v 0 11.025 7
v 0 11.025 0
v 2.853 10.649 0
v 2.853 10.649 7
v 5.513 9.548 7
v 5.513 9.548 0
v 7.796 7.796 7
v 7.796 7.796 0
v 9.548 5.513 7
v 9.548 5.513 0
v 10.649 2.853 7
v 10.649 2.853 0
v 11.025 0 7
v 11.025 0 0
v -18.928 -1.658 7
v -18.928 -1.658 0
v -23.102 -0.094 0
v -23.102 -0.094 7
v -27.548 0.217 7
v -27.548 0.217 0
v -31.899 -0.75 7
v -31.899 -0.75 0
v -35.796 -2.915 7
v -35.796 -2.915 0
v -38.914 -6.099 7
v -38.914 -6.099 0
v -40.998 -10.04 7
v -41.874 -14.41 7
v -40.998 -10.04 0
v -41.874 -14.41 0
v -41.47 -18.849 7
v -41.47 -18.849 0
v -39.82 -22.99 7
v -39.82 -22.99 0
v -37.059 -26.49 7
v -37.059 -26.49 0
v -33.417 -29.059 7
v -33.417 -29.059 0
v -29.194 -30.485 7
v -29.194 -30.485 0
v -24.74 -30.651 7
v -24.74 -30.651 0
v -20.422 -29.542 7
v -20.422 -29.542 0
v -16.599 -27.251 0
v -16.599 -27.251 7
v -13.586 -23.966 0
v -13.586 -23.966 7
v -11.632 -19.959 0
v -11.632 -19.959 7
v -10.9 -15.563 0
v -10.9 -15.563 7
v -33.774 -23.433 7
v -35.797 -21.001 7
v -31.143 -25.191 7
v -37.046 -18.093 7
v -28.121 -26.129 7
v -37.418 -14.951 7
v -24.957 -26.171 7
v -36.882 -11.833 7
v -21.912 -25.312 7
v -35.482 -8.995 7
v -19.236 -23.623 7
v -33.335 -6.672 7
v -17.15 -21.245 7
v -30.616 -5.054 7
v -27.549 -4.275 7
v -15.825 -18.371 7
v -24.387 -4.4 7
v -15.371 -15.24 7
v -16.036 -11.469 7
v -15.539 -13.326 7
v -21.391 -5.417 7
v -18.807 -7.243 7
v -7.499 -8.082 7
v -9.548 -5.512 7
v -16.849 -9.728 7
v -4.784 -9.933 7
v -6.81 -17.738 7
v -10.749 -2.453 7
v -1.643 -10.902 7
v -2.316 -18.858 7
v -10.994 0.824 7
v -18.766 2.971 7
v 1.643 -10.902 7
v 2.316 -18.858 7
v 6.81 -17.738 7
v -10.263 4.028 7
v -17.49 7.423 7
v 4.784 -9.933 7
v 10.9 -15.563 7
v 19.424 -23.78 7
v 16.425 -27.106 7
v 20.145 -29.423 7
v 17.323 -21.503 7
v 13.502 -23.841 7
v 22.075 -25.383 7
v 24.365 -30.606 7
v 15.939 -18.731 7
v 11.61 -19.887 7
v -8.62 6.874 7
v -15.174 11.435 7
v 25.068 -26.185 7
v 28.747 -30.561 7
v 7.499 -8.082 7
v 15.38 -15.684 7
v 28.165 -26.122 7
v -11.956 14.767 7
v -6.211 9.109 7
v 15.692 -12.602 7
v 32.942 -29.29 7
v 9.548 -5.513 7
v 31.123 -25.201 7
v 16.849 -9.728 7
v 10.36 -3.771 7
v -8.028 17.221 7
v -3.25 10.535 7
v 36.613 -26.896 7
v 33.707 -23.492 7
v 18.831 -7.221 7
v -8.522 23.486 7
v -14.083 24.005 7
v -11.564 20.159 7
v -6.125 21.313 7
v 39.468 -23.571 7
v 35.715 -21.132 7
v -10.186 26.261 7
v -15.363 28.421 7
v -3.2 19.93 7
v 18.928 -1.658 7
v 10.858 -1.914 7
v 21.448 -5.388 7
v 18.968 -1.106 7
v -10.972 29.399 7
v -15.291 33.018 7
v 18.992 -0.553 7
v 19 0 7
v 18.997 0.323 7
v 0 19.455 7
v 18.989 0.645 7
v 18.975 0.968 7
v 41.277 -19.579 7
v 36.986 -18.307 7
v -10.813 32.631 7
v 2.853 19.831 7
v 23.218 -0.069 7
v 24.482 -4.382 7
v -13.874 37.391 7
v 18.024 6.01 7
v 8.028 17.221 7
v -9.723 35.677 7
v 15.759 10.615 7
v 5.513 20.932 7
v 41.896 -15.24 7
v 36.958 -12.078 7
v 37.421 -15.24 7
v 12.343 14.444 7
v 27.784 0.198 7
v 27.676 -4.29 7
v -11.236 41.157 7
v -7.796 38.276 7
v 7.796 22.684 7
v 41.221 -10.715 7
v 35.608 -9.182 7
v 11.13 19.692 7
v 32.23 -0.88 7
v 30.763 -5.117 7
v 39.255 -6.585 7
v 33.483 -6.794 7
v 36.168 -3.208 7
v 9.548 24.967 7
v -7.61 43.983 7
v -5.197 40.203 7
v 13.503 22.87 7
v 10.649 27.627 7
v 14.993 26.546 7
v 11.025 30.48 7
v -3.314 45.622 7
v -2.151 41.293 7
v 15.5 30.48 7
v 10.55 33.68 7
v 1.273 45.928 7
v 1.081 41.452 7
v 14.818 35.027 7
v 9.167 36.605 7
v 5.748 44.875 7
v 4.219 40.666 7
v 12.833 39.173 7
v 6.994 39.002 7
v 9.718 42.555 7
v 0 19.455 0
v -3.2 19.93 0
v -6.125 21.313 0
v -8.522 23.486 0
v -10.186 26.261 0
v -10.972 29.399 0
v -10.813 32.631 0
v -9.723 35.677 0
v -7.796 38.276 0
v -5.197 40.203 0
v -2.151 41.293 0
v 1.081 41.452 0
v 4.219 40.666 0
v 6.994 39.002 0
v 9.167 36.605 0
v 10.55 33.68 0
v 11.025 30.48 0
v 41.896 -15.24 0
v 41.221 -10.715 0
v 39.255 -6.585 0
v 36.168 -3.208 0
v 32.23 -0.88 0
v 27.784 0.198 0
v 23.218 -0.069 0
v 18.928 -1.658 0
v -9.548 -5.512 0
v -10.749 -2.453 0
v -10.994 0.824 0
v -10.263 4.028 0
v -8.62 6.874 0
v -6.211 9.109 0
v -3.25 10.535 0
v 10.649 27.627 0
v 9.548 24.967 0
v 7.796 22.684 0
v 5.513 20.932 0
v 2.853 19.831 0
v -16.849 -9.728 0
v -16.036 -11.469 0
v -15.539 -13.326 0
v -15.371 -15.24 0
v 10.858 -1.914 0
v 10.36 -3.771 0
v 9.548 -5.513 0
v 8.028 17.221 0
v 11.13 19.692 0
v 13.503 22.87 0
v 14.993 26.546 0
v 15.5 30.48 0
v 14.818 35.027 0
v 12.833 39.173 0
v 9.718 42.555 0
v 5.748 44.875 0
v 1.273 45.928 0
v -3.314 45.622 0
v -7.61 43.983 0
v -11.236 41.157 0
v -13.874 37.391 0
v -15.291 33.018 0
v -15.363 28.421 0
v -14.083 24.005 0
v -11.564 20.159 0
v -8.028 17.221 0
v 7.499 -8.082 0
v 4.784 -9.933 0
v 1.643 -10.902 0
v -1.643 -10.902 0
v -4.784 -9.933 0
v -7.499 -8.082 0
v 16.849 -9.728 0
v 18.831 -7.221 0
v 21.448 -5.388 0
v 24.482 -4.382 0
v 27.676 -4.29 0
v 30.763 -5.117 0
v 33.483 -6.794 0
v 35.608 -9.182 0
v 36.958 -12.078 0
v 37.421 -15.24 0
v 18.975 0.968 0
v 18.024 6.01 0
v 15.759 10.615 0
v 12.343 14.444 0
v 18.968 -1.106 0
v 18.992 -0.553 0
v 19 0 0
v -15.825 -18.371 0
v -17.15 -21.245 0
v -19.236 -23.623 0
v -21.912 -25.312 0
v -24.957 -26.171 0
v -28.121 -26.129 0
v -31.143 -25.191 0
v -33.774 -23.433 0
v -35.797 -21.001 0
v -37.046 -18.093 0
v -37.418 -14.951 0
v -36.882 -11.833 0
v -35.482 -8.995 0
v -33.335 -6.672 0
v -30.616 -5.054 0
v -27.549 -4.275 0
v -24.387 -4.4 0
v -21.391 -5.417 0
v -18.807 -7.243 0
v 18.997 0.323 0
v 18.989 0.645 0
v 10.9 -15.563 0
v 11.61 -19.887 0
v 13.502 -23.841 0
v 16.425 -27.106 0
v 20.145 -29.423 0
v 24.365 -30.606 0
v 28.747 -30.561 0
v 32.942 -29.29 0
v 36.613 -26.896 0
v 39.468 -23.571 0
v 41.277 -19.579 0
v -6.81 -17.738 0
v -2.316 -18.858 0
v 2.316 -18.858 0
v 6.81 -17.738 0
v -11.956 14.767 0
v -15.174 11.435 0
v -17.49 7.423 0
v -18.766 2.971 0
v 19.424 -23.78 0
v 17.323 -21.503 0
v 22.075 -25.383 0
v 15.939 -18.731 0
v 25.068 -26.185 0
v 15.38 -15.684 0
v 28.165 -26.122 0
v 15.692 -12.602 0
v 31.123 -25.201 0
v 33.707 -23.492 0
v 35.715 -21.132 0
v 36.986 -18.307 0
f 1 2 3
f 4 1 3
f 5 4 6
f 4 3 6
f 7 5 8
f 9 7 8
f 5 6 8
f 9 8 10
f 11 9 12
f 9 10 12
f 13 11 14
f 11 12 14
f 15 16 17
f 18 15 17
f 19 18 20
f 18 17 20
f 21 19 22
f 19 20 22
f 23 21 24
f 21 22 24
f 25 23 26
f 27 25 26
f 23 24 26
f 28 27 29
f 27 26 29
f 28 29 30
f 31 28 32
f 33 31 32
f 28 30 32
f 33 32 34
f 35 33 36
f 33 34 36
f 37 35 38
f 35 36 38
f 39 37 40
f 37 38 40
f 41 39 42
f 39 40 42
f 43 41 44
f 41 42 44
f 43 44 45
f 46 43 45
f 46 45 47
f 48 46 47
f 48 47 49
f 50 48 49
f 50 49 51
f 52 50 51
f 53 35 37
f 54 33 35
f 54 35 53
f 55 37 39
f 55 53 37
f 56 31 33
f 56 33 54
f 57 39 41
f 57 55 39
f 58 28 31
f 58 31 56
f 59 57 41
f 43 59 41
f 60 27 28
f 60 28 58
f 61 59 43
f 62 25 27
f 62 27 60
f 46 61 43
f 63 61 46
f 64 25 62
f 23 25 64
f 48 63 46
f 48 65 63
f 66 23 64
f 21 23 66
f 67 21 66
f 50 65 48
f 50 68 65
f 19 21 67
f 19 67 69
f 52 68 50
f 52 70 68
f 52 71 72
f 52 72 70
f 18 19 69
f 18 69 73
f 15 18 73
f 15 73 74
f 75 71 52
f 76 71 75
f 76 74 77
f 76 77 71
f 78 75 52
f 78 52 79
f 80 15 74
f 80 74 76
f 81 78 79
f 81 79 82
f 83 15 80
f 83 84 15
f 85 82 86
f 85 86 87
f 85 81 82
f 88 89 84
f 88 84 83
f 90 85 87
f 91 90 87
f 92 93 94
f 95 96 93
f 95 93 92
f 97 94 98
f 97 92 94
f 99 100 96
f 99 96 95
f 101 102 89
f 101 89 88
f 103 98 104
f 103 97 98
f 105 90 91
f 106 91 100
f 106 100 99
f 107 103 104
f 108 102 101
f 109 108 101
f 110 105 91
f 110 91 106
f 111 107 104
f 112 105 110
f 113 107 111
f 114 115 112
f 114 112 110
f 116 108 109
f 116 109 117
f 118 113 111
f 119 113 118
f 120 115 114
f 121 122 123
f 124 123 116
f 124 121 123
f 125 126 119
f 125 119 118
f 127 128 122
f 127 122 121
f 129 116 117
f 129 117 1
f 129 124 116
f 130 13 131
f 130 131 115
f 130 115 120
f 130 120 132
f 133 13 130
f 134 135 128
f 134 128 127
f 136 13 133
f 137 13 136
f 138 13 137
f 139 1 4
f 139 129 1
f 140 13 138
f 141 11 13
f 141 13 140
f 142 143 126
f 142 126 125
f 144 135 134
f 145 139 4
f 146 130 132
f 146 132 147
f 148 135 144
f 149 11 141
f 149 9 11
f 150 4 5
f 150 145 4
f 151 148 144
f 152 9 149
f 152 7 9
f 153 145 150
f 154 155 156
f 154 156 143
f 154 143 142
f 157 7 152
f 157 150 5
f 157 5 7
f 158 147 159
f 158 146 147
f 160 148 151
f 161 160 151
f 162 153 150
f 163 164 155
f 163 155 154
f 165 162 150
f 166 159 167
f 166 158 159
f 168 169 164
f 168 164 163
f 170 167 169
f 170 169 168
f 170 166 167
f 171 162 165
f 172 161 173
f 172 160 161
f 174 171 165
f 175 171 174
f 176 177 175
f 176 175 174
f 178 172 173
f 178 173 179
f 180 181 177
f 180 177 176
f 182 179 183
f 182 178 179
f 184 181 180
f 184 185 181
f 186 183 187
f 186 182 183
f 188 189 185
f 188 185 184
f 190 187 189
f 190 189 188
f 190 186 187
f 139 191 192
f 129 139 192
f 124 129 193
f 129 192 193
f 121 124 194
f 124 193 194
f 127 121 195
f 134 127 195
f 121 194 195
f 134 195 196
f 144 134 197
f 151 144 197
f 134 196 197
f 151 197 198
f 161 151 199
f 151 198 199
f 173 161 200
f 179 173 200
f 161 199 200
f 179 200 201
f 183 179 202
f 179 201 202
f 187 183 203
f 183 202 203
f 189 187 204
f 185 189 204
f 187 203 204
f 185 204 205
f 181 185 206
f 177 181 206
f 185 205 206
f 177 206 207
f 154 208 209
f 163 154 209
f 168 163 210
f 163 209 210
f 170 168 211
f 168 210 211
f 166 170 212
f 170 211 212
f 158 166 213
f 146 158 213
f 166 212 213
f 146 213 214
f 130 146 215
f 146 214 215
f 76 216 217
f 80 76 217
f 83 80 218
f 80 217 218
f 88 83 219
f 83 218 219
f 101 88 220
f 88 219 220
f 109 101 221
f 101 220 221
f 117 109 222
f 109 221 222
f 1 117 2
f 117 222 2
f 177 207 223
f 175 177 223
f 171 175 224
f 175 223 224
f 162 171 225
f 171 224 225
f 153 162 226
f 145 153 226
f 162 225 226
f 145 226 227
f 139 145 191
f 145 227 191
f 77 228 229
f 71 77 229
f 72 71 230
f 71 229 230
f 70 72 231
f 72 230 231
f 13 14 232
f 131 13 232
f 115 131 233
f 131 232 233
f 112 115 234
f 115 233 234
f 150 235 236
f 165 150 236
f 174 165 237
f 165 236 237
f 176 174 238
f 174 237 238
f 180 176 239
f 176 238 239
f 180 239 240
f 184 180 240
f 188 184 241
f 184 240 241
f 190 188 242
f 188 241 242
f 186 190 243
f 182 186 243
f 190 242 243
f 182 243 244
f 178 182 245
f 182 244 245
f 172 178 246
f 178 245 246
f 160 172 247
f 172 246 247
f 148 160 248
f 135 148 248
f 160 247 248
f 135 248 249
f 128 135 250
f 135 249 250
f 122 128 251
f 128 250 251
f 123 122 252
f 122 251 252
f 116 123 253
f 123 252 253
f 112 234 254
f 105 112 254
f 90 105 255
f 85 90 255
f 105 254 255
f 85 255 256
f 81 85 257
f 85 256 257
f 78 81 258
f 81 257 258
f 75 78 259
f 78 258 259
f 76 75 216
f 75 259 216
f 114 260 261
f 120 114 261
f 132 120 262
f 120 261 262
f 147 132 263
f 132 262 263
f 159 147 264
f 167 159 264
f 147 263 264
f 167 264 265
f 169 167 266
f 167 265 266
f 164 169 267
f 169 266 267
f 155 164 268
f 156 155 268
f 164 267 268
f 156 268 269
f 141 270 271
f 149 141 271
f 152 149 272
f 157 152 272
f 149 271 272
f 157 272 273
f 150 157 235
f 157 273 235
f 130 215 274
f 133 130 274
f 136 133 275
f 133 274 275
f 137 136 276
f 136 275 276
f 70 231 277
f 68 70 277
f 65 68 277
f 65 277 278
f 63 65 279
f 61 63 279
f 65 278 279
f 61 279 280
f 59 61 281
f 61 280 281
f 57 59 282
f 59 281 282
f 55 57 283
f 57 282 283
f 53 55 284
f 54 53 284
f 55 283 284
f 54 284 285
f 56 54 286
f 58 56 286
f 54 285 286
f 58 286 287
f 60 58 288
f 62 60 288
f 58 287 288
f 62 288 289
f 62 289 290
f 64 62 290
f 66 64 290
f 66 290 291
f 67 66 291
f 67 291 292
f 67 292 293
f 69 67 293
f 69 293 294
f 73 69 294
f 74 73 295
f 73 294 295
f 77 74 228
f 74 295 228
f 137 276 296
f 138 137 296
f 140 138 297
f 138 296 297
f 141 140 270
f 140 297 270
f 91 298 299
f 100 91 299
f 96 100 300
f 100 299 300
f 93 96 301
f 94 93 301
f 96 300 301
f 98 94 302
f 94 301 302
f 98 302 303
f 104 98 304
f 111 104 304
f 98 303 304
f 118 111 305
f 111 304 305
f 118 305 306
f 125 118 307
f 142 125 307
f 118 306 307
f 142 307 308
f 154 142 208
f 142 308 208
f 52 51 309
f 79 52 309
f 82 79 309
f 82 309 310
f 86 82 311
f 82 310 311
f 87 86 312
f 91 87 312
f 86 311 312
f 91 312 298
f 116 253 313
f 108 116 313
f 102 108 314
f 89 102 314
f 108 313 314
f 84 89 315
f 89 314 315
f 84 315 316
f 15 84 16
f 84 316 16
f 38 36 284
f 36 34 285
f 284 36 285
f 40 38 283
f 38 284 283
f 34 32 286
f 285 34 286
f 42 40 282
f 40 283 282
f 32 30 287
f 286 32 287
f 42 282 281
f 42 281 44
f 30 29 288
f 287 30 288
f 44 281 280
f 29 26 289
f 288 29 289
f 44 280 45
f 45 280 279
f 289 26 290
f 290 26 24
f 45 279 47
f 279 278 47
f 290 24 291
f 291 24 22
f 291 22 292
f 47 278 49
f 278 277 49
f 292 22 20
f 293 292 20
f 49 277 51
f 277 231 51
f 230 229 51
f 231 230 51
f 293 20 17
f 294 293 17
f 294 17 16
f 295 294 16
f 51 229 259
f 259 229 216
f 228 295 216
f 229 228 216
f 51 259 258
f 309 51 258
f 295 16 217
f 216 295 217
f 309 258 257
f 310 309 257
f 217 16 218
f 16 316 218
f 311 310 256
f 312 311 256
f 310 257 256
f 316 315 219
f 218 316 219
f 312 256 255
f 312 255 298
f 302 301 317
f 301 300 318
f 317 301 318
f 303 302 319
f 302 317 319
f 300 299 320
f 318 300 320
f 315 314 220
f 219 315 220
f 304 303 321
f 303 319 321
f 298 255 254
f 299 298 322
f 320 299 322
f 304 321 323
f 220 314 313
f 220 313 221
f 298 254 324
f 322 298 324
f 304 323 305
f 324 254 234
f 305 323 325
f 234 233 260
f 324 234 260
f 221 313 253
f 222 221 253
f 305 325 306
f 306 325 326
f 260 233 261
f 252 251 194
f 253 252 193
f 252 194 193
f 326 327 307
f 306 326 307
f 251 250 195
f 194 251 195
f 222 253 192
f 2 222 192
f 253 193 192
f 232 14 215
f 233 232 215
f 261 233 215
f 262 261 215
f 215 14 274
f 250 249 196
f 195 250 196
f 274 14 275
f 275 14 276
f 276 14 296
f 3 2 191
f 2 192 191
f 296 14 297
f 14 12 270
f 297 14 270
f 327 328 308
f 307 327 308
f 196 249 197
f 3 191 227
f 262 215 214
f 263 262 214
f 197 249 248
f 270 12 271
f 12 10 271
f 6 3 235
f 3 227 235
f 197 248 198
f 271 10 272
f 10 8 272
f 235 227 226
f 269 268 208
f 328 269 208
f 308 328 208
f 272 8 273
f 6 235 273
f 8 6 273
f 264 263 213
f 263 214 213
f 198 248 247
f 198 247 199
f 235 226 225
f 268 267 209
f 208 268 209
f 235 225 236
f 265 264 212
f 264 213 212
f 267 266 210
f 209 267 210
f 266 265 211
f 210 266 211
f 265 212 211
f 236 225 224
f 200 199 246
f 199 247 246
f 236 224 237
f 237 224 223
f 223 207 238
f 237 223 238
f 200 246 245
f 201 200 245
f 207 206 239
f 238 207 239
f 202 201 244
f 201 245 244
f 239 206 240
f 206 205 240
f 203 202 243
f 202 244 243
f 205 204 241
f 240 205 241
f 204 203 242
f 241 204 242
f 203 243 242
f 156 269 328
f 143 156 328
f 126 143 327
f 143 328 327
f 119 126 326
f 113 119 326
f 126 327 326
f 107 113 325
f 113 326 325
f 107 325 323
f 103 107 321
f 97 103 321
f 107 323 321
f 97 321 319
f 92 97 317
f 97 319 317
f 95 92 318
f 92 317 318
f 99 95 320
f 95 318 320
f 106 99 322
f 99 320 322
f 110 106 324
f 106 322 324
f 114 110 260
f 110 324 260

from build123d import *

# Parameters (mm, degrees)
F1_DEPTH = 7


with BuildPart() as f1:
    # F0 (on Top) → F1 (new body)
    with BuildSketch(Plane.XY):
        with BuildLine():
            ThreePointArc((0, 19), (4.1112446628, 18.5498697387), (8.0276897851, 17.2208070866))
            ThreePointArc((8.0276897851, 17.2208070866), (13.5033179565, 22.8701114223), (15.5, 30.48))
            ThreePointArc((15.5, 30.48), (-7.6098885777, 43.9833179565), (-8.0276897851, 17.2208070866))
            ThreePointArc((-8.0276897851, 17.2208070866), (-4.1112446628, 18.5498697387), (0, 19))
        make_face()
        with BuildLine():
            ThreePointArc((11.025, 30.48), (7.7958522626, 22.6841477374), (0, 19.455))
            ThreePointArc((0, 19.455), (-7.7958522626, 38.2758522626), (11.025, 30.48))
        make_face(mode=Mode.SUBTRACT)
        with BuildLine():
            ThreePointArc((-9.5479300767, -5.5125), (-9.5479300767, 5.5125), (0, 11.025))
            Line((0, 11.025), (0, 14.98))
            ThreePointArc((0, 14.98), (-4.1672838782, 15.550708487), (-8.0276897851, 17.2208070866))
            ThreePointArc((-8.0276897851, 17.2208070866), (-16.4544826719, 9.5), (-18.9275013032, -1.6582202557))
            ThreePointArc((-18.9275013032, -1.6582202557), (-15.5509505357, -4.1663805402), (-12.9730605487, -7.49))
            Line((-12.9730605487, -7.49), (-9.5479300767, -5.5125))
        make_face()
        with BuildLine():
            ThreePointArc((0, 11.025), (4.6737551189, 9.985321131), (8.4660219047, 7.0623719889))
            Line((8.4660219047, 7.0623719889), (18.9753399185, 0.9677163728))
            ThreePointArc((18.9753399185, 0.9677163728), (15.7585418973, 10.6145351886), (8.0276897851, 17.2208070866))
            ThreePointArc((8.0276897851, 17.2208070866), (4.1672838782, 15.550708487), (0, 14.98))
            Line((0, 14.98), (0, 11.025))
        make_face()
        with BuildLine():
            ThreePointArc((-8.0276897851, 17.2208070866), (-4.1672838782, 15.550708487), (0, 14.98))
            Line((0, 14.98), (0, 19))
            ThreePointArc((0, 19), (-4.1112446628, 18.5498697387), (-8.0276897851, 17.2208070866))
        make_face()
        with BuildLine():
            Line((0, 19), (0, 14.98))
            ThreePointArc((0, 14.98), (4.1672838782, 15.550708487), (8.0276897851, 17.2208070866))
            ThreePointArc((8.0276897851, 17.2208070866), (4.1112446628, 18.5498697387), (0, 19))
        make_face()
        with BuildLine():
            ThreePointArc((-10.8998115181, -15.5625868309), (-14.0090360992, -12.8353771885), (-16.4544826719, -9.5))
            ThreePointArc((-16.4544826719, -9.5), (-18.120280762, -5.7144925502), (-18.9275013032, -1.6582202557))
            ThreePointArc((-18.9275013032, -1.6582202557), (-39.819848066, -22.99), (-10.8998115181, -15.5625868309))
        make_face()
        with BuildLine():
            ThreePointArc((-15.3714543073, -15.24), (-37.0457865422, -18.0934799723), (-16.8485242306, -9.7275))
            ThreePointArc((-16.8485242306, -9.7275), (-15.7471220725, -12.3865200277), (-15.3714543073, -15.24))
        make_face(mode=Mode.SUBTRACT)
        with BuildLine():
            Line((-16.4544826719, -9.5), (-12.9730605487, -7.49))
            ThreePointArc((-12.9730605487, -7.49), (-15.5509505357, -4.1663805402), (-18.9275013032, -1.6582202557))
            ThreePointArc((-18.9275013032, -1.6582202557), (-18.120280762, -5.7144925502), (-16.4544826719, -9.5))
        make_face()
        with BuildLine():
            ThreePointArc((-10.8964543073, -15.24), (-11.4246039999, -11.2283048009), (-12.9730605487, -7.49))
            Line((-12.9730605487, -7.49), (-16.4544826719, -9.5))
            ThreePointArc((-16.4544826719, -9.5), (-14.0090360992, -12.8353771885), (-10.8998115181, -15.5625868309))
            ThreePointArc((-10.8998115181, -15.5625868309), (-10.8972936328, -15.40130215), (-10.8964543073, -15.24))
        make_face()
        with BuildLine():
            Line((12.9730605487, -7.49), (9.5479300767, -5.5125))
            ThreePointArc((9.5479300767, -5.5125), (0, -11.025), (-9.5479300767, -5.5125))
            Line((-9.5479300767, -5.5125), (-12.9730605487, -7.49))
            ThreePointArc((-12.9730605487, -7.49), (-11.4246039999, -11.2283048009), (-10.8964543073, -15.24))
            ThreePointArc((-10.8964543073, -15.24), (-10.8972936328, -15.40130215), (-10.8998115181, -15.5625868309))
            ThreePointArc((-10.8998115181, -15.5625868309), (0, -19), (10.8998115181, -15.5625868309))
            ThreePointArc((10.8998115181, -15.5625868309), (11.3836666575, -11.3843279468), (12.9730605487, -7.49))
        make_face()
        with BuildLine():
            Line((16.4544826719, -9.5), (12.9730605487, -7.49))
            ThreePointArc((12.9730605487, -7.49), (11.3836666575, -11.3843279468), (10.8998115181, -15.5625868309))
            ThreePointArc((10.8998115181, -15.5625868309), (14.0090360992, -12.8353771885), (16.4544826719, -9.5))
        make_face()
        with BuildLine():
            ThreePointArc((8.4660219047, 7.0623719889), (10.3655322222, 3.7558443459), (11.025, 0))
            ThreePointArc((11.025, 0), (10.6493322348, -2.8534799723), (9.5479300767, -5.5125))
            Line((9.5479300767, -5.5125), (12.9730605487, -7.49))
            ThreePointArc((12.9730605487, -7.49), (15.5509505357, -4.1663805402), (18.9275013032, -1.6582202557))
            ThreePointArc((18.9275013032, -1.6582202557), (18.9818666727, -0.8299021746), (19, 0))
            ThreePointArc((19, 0), (18.9938339791, 0.4840152626), (18.9753399185, 0.9677163728))
            Line((18.9753399185, 0.9677163728), (8.4660219047, 7.0623719889))
        make_face()
        with BuildLine():
            ThreePointArc((18.9275013032, -1.6582202557), (15.5509505357, -4.1663805402), (12.9730605487, -7.49))
            Line((12.9730605487, -7.49), (16.4544826719, -9.5))
            ThreePointArc((16.4544826719, -9.5), (18.120280762, -5.7144925502), (18.9275013032, -1.6582202557))
        make_face()
        with BuildLine():
            ThreePointArc((18.9275013032, -1.6582202557), (18.120280762, -5.7144925502), (16.4544826719, -9.5))
            ThreePointArc((16.4544826719, -9.5), (14.0090360992, -12.8353771885), (10.8998115181, -15.5625868309))
            ThreePointArc((10.8998115181, -15.5625868309), (26.5577564573, -30.7391606746), (41.8964543073, -15.24))
            ThreePointArc((41.8964543073, -15.24), (34.2857264042, -1.8979841935), (18.9275013032, -1.6582202557))
        make_face()
        with BuildLine():
            ThreePointArc((37.4214543073, -15.24), (23.5429743351, -25.8893322348), (16.8485242306, -9.7275))
            ThreePointArc((16.8485242306, -9.7275), (29.2499342796, -4.5906677652), (37.4214543073, -15.24))
        make_face(mode=Mode.SUBTRACT)
    extrude(amount=F1_DEPTH)


solid = f1.part
